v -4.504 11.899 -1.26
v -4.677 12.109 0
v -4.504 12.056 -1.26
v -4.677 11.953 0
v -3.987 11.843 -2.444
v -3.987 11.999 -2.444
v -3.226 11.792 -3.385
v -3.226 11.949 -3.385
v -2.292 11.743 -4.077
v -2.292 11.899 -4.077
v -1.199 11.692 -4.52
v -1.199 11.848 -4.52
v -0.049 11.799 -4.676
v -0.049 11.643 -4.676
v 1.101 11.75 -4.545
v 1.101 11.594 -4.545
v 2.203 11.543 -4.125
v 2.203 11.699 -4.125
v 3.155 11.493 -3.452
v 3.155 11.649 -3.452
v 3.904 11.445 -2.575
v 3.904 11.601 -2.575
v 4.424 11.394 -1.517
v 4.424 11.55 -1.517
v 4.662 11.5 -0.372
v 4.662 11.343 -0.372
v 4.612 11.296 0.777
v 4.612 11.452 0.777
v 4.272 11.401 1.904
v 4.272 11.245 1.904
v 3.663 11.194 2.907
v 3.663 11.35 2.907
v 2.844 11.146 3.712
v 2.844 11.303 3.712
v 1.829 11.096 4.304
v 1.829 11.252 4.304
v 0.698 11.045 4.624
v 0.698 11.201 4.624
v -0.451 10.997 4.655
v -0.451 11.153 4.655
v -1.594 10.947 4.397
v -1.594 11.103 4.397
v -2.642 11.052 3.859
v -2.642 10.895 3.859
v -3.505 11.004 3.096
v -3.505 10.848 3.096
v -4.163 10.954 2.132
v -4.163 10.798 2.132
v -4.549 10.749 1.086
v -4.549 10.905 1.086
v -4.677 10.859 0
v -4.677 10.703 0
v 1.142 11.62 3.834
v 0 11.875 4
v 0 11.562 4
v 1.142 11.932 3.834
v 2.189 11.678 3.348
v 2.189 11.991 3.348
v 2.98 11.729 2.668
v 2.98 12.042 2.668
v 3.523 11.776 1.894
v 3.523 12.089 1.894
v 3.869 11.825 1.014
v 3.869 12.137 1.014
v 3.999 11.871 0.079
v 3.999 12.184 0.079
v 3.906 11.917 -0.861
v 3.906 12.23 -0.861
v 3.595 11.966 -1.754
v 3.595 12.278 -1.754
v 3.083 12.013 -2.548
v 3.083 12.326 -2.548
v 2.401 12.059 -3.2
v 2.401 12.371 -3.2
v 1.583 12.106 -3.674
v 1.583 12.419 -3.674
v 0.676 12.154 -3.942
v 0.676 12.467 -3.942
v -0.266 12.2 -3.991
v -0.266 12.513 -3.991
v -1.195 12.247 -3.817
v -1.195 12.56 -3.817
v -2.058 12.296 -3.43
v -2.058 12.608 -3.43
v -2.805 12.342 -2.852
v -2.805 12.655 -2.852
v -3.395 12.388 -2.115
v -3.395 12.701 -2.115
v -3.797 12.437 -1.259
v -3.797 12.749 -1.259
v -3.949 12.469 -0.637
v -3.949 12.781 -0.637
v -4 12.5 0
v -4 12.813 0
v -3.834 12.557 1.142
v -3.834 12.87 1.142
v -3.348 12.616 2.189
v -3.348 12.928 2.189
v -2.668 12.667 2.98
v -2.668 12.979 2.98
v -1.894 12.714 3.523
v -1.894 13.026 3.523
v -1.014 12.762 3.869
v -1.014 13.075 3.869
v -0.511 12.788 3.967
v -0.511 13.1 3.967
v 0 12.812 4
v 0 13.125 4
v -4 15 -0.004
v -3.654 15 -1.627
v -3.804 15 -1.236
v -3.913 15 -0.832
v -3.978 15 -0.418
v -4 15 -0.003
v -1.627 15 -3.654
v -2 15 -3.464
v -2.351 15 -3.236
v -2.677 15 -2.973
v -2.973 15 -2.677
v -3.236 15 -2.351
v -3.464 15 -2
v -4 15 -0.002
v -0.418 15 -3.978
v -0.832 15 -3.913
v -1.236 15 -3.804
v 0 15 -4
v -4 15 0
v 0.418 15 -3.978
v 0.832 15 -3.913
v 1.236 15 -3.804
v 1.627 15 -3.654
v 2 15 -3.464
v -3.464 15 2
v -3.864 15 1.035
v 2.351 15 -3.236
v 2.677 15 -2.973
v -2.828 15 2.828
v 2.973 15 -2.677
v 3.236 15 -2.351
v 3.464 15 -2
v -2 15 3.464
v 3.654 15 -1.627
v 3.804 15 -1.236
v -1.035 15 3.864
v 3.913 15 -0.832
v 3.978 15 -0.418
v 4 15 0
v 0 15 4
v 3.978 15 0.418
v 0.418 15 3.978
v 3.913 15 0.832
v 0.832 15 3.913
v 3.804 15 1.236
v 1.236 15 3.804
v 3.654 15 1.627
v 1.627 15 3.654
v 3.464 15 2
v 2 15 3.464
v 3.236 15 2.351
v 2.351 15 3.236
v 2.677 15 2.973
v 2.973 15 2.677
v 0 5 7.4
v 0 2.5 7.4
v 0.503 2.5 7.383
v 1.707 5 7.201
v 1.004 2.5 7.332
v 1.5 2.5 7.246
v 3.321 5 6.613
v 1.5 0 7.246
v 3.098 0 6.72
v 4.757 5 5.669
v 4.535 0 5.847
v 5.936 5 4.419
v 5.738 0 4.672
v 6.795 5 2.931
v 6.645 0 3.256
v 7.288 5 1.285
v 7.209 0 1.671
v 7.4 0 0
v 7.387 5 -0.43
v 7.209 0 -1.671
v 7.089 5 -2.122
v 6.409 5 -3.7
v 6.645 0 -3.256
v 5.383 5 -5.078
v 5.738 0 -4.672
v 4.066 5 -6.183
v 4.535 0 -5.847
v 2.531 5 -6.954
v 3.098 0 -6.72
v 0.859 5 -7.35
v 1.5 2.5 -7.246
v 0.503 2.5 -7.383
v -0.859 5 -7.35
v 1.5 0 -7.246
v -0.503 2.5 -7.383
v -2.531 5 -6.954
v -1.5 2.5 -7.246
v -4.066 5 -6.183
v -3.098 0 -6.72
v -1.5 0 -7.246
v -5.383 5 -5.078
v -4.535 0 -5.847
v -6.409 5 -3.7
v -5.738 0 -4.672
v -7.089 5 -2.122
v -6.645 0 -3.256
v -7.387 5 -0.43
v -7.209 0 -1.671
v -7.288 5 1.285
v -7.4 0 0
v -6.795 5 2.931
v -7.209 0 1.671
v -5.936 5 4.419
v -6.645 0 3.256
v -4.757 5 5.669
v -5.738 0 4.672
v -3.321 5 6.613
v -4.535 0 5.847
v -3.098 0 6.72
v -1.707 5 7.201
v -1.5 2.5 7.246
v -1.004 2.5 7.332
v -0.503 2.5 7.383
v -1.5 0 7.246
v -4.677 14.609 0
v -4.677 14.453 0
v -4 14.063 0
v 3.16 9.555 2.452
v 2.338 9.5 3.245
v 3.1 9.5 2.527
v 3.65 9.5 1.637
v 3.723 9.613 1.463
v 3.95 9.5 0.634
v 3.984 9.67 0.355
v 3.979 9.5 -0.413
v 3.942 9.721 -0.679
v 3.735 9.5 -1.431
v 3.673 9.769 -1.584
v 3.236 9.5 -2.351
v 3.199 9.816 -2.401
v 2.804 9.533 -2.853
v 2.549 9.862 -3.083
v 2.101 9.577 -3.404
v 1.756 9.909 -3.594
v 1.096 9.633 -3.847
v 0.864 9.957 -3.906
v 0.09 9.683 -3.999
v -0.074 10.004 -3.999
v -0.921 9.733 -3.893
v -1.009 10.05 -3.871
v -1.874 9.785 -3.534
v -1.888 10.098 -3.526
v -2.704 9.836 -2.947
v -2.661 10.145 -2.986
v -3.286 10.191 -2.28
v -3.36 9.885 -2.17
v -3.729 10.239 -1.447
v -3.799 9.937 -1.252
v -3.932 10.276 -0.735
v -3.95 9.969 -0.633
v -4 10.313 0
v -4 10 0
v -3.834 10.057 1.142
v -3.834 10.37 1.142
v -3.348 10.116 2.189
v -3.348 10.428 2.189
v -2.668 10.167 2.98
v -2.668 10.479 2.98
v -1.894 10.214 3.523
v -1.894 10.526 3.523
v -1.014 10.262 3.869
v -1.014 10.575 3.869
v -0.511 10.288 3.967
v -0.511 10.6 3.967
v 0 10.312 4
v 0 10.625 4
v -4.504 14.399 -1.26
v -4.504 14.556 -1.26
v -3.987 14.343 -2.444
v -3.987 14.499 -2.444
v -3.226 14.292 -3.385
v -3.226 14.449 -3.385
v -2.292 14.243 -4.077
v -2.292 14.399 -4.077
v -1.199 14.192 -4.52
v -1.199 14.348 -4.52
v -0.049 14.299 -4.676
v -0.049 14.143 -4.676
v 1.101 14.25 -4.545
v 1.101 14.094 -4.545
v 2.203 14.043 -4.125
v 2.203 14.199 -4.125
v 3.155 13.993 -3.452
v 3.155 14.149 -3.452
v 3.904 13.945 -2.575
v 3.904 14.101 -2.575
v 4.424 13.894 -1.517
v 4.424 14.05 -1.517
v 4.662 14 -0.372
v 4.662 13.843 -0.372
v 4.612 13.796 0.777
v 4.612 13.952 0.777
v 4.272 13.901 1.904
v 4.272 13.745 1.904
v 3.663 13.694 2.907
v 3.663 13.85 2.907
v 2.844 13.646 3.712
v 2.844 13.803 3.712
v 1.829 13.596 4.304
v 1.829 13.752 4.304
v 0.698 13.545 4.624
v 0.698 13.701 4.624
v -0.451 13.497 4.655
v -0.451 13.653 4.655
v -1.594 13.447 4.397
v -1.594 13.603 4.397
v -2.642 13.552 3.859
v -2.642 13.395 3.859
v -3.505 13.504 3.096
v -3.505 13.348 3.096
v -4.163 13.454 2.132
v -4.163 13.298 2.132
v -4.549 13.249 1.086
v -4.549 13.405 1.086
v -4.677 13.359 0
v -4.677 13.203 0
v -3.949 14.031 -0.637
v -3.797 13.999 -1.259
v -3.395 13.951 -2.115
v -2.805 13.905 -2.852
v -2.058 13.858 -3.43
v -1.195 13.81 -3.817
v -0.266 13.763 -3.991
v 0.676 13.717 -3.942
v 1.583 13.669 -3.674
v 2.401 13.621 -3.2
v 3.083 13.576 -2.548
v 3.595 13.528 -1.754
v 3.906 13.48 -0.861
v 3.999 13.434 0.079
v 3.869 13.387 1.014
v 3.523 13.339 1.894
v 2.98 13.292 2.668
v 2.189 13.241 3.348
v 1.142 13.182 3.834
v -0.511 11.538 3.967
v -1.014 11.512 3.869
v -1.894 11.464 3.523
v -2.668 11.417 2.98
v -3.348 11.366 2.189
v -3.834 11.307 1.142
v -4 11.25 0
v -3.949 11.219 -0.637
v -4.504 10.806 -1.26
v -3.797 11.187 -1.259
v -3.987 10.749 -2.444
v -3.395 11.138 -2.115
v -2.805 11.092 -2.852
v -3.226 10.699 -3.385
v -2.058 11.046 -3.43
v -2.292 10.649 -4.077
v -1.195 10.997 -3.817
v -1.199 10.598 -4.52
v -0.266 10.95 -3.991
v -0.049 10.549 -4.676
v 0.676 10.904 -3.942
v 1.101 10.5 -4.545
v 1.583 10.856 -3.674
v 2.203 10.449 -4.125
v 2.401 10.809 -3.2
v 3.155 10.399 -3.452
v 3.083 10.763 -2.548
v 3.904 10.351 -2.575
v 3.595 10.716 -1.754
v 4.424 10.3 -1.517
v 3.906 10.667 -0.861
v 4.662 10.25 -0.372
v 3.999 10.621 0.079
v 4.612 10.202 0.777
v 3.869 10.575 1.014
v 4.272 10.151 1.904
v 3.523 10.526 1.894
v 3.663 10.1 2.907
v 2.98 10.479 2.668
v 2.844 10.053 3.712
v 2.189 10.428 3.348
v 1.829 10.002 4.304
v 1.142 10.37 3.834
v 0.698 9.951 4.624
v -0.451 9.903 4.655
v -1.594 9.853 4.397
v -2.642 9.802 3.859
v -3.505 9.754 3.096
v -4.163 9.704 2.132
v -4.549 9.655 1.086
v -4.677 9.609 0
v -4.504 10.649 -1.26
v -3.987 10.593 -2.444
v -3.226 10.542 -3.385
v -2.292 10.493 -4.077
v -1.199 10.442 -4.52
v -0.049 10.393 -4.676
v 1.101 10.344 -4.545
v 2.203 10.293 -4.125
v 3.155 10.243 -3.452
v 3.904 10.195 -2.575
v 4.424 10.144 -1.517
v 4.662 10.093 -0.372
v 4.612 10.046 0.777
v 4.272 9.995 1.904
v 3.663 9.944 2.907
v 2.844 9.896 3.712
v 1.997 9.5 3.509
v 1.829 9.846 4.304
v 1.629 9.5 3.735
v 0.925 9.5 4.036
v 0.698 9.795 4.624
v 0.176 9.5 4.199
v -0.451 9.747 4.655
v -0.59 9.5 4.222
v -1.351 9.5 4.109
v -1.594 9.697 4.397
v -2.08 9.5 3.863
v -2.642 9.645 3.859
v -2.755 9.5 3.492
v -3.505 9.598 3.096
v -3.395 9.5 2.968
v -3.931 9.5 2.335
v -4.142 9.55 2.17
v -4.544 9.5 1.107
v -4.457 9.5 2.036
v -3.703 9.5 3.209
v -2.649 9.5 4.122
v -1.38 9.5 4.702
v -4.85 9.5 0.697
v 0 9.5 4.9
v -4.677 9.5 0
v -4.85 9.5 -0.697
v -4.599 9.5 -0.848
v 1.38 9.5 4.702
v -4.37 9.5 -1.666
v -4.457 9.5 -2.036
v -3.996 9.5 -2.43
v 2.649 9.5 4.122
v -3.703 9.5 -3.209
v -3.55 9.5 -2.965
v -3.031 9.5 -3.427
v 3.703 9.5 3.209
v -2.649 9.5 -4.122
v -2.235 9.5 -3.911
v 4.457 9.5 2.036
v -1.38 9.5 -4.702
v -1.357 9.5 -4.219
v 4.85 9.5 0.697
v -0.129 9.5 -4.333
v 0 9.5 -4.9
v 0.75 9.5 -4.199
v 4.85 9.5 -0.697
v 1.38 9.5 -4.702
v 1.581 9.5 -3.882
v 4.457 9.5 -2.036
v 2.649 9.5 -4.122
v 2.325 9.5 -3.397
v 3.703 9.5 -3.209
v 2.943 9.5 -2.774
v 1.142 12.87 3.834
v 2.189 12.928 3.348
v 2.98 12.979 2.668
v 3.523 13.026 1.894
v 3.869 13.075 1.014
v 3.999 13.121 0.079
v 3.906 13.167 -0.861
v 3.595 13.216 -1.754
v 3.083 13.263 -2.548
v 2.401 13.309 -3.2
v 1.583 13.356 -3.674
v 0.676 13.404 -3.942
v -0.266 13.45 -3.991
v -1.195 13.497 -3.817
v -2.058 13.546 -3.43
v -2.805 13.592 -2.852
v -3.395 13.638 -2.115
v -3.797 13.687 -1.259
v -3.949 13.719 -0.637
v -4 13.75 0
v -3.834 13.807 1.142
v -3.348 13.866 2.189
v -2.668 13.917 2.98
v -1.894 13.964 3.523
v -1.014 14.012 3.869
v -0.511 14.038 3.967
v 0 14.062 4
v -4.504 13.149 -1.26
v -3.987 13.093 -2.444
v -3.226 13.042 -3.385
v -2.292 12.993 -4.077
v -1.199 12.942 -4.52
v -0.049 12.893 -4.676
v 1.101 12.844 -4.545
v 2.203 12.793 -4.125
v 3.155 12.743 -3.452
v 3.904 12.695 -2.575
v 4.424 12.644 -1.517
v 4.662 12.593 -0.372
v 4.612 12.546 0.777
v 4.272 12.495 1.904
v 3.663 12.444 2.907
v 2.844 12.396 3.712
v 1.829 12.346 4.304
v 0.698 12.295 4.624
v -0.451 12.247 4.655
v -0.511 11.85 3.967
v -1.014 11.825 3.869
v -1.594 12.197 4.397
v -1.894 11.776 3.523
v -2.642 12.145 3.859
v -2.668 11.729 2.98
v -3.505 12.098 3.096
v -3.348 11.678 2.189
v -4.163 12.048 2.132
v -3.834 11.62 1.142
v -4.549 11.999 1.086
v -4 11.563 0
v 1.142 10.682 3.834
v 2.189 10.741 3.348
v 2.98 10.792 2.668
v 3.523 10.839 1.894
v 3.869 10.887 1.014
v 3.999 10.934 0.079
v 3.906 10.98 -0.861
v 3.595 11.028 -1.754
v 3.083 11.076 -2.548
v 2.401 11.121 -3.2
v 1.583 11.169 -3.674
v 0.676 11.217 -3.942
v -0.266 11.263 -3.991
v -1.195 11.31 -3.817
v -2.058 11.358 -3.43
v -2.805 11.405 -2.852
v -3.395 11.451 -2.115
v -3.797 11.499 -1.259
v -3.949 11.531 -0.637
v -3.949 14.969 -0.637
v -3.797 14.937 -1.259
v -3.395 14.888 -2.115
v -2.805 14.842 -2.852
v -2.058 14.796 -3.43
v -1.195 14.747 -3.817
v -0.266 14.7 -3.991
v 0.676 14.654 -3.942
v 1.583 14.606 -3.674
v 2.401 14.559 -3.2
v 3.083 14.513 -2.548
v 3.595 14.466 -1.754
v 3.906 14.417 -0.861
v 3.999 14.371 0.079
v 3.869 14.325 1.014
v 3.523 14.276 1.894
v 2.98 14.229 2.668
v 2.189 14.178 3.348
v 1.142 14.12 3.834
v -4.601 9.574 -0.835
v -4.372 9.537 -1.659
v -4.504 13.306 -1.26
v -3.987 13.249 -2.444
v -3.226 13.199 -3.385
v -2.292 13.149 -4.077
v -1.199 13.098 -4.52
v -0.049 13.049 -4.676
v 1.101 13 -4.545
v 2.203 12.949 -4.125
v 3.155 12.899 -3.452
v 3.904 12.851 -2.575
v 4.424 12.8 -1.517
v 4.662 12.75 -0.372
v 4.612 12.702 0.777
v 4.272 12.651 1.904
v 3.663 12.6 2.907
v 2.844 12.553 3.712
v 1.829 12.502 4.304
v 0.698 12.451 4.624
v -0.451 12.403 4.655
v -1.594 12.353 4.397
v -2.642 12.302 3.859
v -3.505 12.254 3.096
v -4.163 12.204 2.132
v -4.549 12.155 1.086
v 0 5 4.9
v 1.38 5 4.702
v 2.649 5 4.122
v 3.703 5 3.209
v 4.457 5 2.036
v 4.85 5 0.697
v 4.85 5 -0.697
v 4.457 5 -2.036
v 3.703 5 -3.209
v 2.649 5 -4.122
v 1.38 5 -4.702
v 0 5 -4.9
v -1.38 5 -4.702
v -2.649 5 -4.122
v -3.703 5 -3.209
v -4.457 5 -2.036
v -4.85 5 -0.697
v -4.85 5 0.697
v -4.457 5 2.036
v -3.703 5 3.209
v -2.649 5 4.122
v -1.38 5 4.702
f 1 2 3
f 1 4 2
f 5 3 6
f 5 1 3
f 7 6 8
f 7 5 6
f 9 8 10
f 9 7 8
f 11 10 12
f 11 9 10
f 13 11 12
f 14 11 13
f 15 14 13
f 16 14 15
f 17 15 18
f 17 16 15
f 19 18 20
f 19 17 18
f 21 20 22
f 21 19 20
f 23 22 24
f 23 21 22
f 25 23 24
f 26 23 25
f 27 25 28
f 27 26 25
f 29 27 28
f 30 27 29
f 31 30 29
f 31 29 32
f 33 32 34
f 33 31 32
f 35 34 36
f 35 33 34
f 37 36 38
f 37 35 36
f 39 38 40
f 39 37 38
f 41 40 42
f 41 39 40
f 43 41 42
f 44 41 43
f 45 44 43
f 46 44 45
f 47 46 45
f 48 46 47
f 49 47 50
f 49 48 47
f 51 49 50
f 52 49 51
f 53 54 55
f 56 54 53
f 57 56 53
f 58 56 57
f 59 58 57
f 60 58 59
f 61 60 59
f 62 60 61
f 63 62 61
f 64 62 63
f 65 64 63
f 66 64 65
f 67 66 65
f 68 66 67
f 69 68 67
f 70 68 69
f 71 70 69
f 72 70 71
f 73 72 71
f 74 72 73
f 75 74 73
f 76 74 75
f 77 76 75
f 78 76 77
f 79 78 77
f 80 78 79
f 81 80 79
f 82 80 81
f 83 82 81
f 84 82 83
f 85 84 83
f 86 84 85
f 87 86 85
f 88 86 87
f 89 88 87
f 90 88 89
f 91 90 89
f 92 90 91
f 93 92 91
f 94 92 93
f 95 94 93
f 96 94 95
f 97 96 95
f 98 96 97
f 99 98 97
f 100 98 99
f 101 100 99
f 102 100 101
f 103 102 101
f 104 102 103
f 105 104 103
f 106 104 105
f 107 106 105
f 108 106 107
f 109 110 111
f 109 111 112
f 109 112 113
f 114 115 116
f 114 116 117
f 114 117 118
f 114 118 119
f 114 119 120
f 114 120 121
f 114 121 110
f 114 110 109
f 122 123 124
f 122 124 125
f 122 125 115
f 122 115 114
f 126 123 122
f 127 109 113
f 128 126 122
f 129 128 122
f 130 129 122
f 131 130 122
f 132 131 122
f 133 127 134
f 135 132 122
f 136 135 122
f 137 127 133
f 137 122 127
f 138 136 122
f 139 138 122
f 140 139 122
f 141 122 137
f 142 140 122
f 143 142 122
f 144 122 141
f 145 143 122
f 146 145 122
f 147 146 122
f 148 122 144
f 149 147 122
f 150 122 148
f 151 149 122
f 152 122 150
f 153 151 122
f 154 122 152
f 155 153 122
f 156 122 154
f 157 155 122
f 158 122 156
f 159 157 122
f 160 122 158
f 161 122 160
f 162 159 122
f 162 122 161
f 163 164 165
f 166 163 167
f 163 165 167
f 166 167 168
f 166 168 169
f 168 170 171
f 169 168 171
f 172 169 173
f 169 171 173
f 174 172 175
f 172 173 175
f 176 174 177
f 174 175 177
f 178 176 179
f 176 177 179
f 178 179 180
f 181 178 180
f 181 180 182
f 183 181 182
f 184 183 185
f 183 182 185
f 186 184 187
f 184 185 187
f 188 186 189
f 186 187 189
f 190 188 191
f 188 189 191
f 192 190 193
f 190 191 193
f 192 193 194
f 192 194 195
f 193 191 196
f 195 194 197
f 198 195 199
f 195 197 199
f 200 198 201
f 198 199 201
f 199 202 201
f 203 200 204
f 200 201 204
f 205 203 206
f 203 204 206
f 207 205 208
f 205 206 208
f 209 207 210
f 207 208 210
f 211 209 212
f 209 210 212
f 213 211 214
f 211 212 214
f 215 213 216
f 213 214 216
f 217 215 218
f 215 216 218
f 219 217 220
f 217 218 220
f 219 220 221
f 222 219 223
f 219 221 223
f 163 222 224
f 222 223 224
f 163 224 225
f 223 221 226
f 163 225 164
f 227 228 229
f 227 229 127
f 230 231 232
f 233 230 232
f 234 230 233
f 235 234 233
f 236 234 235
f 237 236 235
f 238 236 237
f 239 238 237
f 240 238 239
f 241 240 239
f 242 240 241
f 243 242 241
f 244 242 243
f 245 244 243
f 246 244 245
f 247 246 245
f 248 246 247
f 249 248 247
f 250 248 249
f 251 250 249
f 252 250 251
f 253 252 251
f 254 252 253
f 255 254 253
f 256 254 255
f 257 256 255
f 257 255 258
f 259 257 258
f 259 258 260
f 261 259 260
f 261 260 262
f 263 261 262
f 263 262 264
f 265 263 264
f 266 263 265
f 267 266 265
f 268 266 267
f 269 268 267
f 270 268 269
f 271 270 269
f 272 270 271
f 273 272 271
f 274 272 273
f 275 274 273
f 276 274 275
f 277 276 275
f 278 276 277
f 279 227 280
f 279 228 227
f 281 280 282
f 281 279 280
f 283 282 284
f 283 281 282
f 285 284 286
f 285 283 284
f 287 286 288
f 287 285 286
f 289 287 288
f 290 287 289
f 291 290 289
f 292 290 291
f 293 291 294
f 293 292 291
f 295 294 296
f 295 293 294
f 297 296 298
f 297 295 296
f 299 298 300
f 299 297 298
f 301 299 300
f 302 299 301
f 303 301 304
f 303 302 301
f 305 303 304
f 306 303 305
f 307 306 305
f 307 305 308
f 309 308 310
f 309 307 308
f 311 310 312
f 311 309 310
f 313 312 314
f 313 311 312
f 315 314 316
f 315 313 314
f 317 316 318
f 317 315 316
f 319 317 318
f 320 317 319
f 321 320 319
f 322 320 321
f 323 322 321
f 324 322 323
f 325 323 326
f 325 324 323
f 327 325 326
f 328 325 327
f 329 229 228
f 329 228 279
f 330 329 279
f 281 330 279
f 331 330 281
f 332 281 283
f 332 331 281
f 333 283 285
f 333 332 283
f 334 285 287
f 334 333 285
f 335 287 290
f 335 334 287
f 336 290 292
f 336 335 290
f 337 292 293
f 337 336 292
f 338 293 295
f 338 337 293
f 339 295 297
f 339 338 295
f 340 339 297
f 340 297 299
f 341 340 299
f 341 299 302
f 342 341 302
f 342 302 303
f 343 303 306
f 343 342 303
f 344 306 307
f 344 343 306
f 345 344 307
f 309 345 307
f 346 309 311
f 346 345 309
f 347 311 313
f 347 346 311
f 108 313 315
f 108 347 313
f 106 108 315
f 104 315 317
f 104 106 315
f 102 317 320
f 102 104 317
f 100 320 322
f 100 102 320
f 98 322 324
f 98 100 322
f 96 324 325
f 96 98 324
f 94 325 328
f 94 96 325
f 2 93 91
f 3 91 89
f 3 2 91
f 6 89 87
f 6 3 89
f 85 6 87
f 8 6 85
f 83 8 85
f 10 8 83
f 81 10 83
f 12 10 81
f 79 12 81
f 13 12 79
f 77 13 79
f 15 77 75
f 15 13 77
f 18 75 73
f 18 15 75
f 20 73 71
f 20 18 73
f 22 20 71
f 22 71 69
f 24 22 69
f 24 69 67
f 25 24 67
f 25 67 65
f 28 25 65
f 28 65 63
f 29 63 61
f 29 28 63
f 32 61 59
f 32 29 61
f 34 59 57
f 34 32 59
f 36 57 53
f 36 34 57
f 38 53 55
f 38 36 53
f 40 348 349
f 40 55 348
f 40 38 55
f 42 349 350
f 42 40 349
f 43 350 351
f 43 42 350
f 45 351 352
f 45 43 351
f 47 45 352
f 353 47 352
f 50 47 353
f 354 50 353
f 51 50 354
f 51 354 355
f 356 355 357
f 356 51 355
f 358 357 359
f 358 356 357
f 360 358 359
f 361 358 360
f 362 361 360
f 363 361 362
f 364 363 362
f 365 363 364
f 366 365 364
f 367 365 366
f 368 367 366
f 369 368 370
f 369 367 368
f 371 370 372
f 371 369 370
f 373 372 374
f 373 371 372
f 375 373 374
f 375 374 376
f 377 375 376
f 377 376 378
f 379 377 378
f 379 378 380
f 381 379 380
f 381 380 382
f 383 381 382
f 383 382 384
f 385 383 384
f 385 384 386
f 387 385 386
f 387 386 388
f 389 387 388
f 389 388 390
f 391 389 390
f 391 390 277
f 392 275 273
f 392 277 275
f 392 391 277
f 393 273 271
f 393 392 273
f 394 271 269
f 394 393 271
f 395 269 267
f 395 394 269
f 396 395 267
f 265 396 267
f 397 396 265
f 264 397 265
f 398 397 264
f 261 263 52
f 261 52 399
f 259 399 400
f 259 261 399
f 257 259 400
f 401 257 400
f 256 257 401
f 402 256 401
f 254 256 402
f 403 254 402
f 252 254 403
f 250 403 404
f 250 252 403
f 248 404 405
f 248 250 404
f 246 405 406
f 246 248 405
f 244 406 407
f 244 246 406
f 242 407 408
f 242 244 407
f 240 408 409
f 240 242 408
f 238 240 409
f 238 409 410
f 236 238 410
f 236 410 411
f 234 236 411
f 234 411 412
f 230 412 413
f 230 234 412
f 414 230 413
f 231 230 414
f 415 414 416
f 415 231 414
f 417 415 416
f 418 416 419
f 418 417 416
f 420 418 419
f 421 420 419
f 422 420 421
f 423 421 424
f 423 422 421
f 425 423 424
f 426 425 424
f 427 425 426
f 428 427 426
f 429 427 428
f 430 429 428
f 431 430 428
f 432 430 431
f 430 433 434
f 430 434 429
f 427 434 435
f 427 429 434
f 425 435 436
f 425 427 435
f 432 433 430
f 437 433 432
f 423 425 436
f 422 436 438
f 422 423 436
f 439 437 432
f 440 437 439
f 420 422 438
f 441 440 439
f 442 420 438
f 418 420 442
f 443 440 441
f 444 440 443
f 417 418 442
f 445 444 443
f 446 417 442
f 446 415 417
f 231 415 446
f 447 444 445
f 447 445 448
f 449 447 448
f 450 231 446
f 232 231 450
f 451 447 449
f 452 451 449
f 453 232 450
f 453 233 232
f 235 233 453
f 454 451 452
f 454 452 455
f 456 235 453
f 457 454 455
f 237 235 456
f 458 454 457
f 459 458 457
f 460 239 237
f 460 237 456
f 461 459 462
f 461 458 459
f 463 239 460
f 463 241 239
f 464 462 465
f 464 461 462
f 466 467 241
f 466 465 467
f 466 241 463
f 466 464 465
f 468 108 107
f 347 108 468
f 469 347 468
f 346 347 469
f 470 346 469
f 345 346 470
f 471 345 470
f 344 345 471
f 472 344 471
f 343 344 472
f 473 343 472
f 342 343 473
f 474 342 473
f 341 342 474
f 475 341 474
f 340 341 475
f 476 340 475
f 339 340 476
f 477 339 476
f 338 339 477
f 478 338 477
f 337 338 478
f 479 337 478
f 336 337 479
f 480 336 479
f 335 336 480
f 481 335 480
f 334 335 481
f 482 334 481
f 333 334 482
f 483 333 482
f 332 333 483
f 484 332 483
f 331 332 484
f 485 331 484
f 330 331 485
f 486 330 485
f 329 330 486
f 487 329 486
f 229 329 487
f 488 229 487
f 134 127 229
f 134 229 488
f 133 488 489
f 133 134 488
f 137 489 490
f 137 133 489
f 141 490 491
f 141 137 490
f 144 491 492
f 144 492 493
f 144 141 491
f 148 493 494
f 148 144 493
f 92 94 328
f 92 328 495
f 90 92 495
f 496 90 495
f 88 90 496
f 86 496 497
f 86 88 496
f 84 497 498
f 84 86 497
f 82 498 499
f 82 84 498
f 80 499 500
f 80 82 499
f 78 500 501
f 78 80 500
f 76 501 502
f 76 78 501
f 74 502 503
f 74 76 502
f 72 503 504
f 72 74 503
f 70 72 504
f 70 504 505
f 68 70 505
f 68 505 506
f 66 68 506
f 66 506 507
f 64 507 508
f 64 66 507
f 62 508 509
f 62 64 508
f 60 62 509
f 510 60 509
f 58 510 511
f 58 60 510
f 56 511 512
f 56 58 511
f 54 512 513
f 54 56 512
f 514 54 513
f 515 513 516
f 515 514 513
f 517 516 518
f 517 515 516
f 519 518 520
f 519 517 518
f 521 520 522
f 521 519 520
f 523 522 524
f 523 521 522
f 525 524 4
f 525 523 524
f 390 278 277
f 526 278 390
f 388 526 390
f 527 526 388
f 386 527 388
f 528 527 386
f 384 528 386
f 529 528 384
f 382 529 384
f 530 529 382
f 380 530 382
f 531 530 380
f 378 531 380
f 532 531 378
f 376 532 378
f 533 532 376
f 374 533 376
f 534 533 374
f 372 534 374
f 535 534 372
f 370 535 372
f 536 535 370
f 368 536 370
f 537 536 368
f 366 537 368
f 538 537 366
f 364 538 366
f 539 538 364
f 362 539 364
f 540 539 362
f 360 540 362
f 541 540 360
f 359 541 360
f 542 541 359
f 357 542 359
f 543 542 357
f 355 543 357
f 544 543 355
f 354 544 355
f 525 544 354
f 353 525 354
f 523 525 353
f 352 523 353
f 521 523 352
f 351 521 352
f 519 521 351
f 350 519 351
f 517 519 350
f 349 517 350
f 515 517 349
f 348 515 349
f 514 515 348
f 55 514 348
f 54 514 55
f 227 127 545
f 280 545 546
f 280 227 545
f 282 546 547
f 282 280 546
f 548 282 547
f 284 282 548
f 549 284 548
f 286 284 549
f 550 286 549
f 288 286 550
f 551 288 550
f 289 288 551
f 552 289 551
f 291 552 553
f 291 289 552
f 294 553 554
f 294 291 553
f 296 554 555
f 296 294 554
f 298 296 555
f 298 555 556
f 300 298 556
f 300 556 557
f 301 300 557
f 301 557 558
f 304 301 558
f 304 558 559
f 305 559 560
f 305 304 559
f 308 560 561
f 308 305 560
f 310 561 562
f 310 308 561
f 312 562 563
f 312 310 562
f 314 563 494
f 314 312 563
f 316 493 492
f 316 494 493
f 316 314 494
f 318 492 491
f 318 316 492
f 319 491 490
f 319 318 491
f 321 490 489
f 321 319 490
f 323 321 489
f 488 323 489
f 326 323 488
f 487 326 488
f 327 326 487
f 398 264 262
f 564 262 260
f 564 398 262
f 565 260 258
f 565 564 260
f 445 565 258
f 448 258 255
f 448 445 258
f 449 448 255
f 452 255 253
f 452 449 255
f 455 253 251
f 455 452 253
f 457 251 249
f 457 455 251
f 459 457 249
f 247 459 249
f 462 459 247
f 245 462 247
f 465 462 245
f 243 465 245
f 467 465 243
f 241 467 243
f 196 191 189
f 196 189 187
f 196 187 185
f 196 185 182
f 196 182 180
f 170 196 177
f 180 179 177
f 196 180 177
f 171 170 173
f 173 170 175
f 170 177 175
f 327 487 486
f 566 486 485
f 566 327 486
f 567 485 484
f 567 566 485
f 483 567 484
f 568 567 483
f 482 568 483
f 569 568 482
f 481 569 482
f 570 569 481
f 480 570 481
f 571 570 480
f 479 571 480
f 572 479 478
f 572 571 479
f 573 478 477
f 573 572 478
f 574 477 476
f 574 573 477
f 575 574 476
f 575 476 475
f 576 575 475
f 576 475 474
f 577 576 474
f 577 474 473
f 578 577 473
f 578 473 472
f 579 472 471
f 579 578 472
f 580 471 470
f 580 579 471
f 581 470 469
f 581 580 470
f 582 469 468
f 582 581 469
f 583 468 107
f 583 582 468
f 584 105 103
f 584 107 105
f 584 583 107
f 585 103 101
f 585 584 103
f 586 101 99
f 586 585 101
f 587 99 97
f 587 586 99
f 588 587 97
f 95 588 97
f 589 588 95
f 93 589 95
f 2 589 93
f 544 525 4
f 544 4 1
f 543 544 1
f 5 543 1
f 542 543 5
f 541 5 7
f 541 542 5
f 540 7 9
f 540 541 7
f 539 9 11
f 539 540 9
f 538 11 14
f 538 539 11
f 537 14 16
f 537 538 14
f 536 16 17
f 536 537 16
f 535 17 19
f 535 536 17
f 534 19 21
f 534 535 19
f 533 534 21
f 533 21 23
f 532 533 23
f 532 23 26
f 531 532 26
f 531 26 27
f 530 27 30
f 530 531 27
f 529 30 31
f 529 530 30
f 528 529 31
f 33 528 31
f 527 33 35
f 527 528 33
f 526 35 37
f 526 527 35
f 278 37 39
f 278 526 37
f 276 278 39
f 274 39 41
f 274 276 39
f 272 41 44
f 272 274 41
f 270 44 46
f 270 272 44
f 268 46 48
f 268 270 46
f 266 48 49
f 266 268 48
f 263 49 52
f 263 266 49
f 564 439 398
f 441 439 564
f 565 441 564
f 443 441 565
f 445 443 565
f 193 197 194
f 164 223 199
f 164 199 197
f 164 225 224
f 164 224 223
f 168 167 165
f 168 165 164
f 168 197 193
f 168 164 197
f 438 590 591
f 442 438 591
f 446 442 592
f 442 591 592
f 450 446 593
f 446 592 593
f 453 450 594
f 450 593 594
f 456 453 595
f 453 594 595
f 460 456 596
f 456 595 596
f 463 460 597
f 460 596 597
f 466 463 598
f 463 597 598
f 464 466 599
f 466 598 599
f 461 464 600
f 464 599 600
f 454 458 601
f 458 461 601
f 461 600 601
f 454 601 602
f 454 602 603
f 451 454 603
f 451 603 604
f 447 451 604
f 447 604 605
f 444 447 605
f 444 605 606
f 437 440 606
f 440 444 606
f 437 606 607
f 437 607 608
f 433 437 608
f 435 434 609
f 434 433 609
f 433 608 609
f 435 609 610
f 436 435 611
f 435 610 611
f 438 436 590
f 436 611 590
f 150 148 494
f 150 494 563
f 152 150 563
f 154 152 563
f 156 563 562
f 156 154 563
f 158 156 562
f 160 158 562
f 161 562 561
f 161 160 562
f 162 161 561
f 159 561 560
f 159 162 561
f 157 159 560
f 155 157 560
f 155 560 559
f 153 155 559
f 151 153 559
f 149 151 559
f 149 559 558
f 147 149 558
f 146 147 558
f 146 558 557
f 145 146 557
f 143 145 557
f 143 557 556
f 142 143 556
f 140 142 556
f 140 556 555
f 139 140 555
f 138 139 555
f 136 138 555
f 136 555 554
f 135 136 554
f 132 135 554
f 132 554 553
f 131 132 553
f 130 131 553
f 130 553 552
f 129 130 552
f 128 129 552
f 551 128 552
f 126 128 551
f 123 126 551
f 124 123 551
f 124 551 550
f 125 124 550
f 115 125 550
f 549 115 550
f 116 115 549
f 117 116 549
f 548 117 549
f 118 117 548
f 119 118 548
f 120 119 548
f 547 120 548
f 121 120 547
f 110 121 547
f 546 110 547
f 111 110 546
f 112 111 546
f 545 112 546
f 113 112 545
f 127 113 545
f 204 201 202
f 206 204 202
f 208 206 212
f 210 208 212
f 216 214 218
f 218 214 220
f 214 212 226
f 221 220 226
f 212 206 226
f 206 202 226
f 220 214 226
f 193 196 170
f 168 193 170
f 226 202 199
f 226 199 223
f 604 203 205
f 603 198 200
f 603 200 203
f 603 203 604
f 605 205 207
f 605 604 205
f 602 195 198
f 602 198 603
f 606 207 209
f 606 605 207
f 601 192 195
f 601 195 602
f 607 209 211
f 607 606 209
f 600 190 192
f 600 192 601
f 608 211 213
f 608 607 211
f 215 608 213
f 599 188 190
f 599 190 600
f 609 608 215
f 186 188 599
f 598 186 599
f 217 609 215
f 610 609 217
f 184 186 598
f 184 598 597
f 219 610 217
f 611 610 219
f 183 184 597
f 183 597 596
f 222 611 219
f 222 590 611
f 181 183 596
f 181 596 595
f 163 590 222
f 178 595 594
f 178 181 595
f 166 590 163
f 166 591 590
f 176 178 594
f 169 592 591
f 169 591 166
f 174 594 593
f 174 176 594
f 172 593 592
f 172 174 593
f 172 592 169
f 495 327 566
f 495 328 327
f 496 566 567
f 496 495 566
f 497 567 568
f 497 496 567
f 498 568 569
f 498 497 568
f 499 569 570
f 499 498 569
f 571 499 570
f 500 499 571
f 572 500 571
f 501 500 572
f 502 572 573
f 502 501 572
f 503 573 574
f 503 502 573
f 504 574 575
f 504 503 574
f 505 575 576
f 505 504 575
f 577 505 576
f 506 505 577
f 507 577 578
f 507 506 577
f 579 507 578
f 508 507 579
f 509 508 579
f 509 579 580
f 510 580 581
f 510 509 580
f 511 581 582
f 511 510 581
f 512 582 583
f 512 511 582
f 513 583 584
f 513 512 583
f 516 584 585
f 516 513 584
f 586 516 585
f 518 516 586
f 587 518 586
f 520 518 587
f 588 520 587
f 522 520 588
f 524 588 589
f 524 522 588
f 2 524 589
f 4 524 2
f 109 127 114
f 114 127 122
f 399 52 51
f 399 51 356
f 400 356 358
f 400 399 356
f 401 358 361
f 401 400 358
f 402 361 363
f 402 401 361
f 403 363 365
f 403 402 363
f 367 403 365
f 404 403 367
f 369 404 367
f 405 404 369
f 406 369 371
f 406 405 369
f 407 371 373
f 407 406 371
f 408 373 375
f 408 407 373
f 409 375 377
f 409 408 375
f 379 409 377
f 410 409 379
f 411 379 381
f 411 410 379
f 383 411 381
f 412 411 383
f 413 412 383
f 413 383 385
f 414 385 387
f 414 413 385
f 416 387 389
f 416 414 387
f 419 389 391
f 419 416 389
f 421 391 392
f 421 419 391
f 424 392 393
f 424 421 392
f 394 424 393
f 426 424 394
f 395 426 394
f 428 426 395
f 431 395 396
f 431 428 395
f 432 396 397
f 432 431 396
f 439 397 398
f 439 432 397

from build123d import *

# Parameters (mm, degrees)
SKETCH1_R           = 7.4
BOSS_EXTRUDE1_DEPTH = 5
SKETCH2_R           = 4.9
BOSS_EXTRUDE2_DEPTH = 10
SKETCH13_OUTSIDE_W  = 21.95
SKETCH13_OUTSIDE_H  = 21.95
SKETCH13_OUTSIDE_R  = 4
CUT_EXTRUDE4_DEPTH  = 5.5
THREAD2_PITCH       = 1.25
SKETCH5_W           = 3
SKETCH5_H           = 14.8
CUT_EXTRUDE5_DEPTH  = 2.5


with BuildPart() as part:
    # Sketch1 → Boss-Extrude1 (new body)
    with BuildSketch(Plane(origin=(0, 0, 0), x_dir=(1, 0, 0), z_dir=(0, 1, 0))):
        with Locations(Location((0, 0, 0), (0, 0, 270))):
            Circle(SKETCH1_R)
    extrude(amount=BOSS_EXTRUDE1_DEPTH)

    # Sketch2 → Boss-Extrude2 (add)
    with BuildSketch(Plane(origin=(0, 5, 0), x_dir=(1, 0, 0), z_dir=(0, 1, 0))):
        with Locations(Location((0, 0, 0), (0, 0, 270))):
            Circle(SKETCH2_R)
    extrude(amount=BOSS_EXTRUDE2_DEPTH)

    # Sketch13 outside → Cut-Extrude4 (cut)
    with BuildSketch(Plane(origin=(0, 15, 0), x_dir=(1, 0, 0), z_dir=(0, 1, 0))):
        Rectangle(SKETCH13_OUTSIDE_W, SKETCH13_OUTSIDE_H)
        with Locations(Location((0, 0, 0), (0, 0, 270))):
            Circle(SKETCH13_OUTSIDE_R, mode=Mode.SUBTRACT)
    extrude(amount=-CUT_EXTRUDE4_DEPTH, mode=Mode.SUBTRACT)

    # Thread2: the profile of Thread Profile4 profile screwed along a right-hand helix of 4.4 turns, 8 arcs to a turn; built about Z, then put on its axis
    thread2_z = Axis((0, 0, 0), (0, 0, 1))
    thread2_corners = [(3.9997, 0, -0.000173205), (4.676582344, 0, 0.390624998), (4.676582344, 0, 0.546874998), (3.9997, 0, 0.937673202)]
    with BuildLine(mode=Mode.PRIVATE) as thread2_profile:
        Line(thread2_corners[0], thread2_corners[1])
        Line(thread2_corners[1], thread2_corners[2])
        Line(thread2_corners[2], thread2_corners[3])
        Line(thread2_corners[3], thread2_corners[0])
    thread2_cap = Face(thread2_profile.wire())
    thread2_turn_angles = [0, 22.5, 45, 67.5, 90, 112.5, 135, 157.5, 180, 202.5, 225, 247.5, 270, 292.5, 315, 337.5, 360]
    thread2_turn_weights = [1, 0.9238795325112867, 1, 0.9238795325112867, 1, 0.9238795325112867, 1, 0.9238795325112867, 1, 0.9238795325112867, 1, 0.9238795325112867, 1, 0.9238795325112867, 1, 0.9238795325112867, 1]
    thread2_turn_rails = [Edge.make_bspline([Vector(p[0], p[1], 0).rotate(thread2_z, thread2_turn_angles[k]) / thread2_turn_weights[k] + Vector(0, 0, p[2] + THREAD2_PITCH * thread2_turn_angles[k] / 360) for k in range(17)], [0, 0, 0, 1, 1, 2, 2, 3, 3, 4, 4, 5, 5, 6, 6, 7, 7, 8, 8, 8], 2, thread2_turn_weights) for p in thread2_corners]
    thread2_turn_sides = [Face.make_surface_from_curves(thread2_turn_rails[p[0]], thread2_turn_rails[p[1]]) for p in [(0, 1), (1, 2), (2, 3), (3, 0)]]
    thread2_last_angles = [1440, 1462.5, 1485, 1507.5, 1530, 1552.5, 1575, 1579.5, 1584]
    thread2_last_weights = [1, 0.9238795325112867, 1, 0.9238795325112867, 1, 0.9238795325112867, 1, 0.996917333733128, 1]
    thread2_last_rails = [Edge.make_bspline([Vector(p[0], p[1], 0).rotate(thread2_z, thread2_last_angles[k]) / thread2_last_weights[k] + Vector(0, 0, p[2] + THREAD2_PITCH * thread2_last_angles[k] / 360) for k in range(9)], [0, 0, 0, 1, 1, 2, 2, 3, 3, 4, 4, 4], 2, thread2_last_weights) for p in thread2_corners]
    thread2_last_sides = [Face.make_surface_from_curves(thread2_last_rails[p[0]], thread2_last_rails[p[1]]) for p in [(0, 1), (1, 2), (2, 3), (3, 0)]]
    thread2 = Plane(origin=(0, 15, 0), x_dir=(-1, 0, 0), z_dir=(0, -1, 0)) * Solid(Shell([*[p.moved(Location((0, 0, THREAD2_PITCH * i))) for i in range(4) for p in thread2_turn_sides], *thread2_last_sides, thread2_cap, thread2_cap.rotate(thread2_z, 1584).moved(Location((0, 0, THREAD2_PITCH * 1584 / 360)))]))
    add(thread2)

    # Sketch5 → Cut-Extrude5 (cut)
    with BuildSketch(Plane.XZ):
        Rectangle(SKETCH5_W, SKETCH5_H)
    extrude(amount=-CUT_EXTRUDE5_DEPTH, mode=Mode.SUBTRACT)


solid = part.part
